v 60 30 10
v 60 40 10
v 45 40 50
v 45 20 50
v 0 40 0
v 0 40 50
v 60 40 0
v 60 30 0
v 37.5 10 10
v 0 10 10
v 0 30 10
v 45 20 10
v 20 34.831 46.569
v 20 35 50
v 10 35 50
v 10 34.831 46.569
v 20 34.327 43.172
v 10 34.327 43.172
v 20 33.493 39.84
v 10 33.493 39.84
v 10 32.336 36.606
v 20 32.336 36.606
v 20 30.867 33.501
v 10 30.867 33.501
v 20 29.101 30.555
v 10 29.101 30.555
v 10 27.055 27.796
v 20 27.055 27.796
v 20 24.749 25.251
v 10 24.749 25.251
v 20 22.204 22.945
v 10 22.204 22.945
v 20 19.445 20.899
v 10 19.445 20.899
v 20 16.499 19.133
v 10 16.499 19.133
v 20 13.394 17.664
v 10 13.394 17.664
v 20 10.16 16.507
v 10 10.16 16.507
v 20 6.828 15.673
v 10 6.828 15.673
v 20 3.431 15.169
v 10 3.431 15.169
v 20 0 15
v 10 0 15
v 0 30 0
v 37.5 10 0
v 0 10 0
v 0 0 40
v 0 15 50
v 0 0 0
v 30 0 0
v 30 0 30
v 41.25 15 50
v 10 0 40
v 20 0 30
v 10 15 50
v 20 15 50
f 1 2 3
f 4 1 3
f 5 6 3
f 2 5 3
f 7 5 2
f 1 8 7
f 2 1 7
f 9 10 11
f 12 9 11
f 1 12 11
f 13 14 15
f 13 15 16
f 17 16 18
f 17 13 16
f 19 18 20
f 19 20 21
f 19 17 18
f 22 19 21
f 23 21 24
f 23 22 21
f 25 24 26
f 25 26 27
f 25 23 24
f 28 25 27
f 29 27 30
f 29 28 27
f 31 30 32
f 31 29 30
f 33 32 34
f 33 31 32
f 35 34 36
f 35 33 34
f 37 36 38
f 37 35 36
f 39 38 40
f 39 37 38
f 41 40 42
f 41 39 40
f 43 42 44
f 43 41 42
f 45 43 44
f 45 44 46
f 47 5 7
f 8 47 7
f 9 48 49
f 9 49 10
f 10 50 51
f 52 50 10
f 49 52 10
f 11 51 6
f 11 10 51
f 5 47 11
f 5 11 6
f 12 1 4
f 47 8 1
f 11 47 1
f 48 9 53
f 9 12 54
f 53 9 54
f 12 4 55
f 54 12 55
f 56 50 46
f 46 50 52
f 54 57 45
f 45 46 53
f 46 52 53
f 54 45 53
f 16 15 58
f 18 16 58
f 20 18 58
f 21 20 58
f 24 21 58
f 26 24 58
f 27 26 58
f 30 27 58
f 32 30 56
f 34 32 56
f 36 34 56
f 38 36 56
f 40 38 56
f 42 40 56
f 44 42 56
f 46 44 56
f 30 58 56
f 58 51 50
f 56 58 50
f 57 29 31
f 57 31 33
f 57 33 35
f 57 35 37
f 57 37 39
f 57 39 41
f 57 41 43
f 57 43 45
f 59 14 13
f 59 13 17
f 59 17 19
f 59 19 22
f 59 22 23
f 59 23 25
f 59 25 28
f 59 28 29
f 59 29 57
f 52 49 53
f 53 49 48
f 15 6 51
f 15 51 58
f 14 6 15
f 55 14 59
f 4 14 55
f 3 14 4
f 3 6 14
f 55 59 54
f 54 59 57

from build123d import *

# Parameters (mm, degrees)
F0_W      = 60
F0_H      = 40
F1_DEPTH  = 50
F2_W      = 20
F2_H      = 10
F3_DEPTH  = 60.001
F5_R      = 35
F6_DEPTH  = 10
F8_DEPTH  = 50.001
F10_DEPTH = 10
F12_DEPTH = 40.001
F14_DEPTH = 40.001


with BuildPart() as f1:
    # F0 (on Top) → F1 (new body)
    with BuildSketch(Plane.XY):
        with Locations((30, 20)):
            Rectangle(F0_W, F0_H)
    extrude(amount=F1_DEPTH)

    # F2 (on face) → F3 (cut, through all)
    with BuildSketch(Plane.YZ.offset(60)):
        with Locations((20, 5)):
            Rectangle(F2_W, F2_H)
    extrude(amount=-F3_DEPTH, mode=Mode.SUBTRACT)

    # F5 (on offset) → F6 (cut)
    with BuildSketch(Plane(origin=(20, 0, 0), x_dir=(0, -1, 0), z_dir=(-1, 0, 0))):
        with Locations((0, 50)):
            Circle(F5_R)
    extrude(amount=F6_DEPTH, mode=Mode.SUBTRACT)

    # F7 (on face) → F8 (cut, through all)
    with BuildSketch(Plane.XY.offset(50)):
        Polygon((40, 0), (60, 0), (60, 30), (45, 20), (30, 0), align=None)
    extrude(amount=-F8_DEPTH, mode=Mode.SUBTRACT)

    # F9 (on face) → F10 (cut, through all)
    with BuildSketch(Plane(origin=(0, 0, 0), x_dir=(0, -1, 0), z_dir=(-1, 0, 0))):
        Polygon((0, 40), (0, 50), (-15, 50), align=None)
    extrude(amount=-F10_DEPTH, mode=Mode.SUBTRACT)

    # F11 (on offset) → F12 (cut, through all)
    with BuildSketch(Plane(origin=(20, 0, 0), x_dir=(0, -1, 0), z_dir=(-1, 0, 0))):
        Polygon((-15, 50), (0, 30), (0, 50), align=None)
    extrude(amount=-F12_DEPTH, mode=Mode.SUBTRACT)

    # F13 (on face) → F14 (cut, through all)
    with BuildSketch(Plane(origin=(0, 40, 0), x_dir=(-1, 0, 0), z_dir=(0, 1, 0))):
        Polygon((-45, 50), (-60, 50), (-60, 10), align=None)
    extrude(amount=-F14_DEPTH, mode=Mode.SUBTRACT)


solid = f1.part
